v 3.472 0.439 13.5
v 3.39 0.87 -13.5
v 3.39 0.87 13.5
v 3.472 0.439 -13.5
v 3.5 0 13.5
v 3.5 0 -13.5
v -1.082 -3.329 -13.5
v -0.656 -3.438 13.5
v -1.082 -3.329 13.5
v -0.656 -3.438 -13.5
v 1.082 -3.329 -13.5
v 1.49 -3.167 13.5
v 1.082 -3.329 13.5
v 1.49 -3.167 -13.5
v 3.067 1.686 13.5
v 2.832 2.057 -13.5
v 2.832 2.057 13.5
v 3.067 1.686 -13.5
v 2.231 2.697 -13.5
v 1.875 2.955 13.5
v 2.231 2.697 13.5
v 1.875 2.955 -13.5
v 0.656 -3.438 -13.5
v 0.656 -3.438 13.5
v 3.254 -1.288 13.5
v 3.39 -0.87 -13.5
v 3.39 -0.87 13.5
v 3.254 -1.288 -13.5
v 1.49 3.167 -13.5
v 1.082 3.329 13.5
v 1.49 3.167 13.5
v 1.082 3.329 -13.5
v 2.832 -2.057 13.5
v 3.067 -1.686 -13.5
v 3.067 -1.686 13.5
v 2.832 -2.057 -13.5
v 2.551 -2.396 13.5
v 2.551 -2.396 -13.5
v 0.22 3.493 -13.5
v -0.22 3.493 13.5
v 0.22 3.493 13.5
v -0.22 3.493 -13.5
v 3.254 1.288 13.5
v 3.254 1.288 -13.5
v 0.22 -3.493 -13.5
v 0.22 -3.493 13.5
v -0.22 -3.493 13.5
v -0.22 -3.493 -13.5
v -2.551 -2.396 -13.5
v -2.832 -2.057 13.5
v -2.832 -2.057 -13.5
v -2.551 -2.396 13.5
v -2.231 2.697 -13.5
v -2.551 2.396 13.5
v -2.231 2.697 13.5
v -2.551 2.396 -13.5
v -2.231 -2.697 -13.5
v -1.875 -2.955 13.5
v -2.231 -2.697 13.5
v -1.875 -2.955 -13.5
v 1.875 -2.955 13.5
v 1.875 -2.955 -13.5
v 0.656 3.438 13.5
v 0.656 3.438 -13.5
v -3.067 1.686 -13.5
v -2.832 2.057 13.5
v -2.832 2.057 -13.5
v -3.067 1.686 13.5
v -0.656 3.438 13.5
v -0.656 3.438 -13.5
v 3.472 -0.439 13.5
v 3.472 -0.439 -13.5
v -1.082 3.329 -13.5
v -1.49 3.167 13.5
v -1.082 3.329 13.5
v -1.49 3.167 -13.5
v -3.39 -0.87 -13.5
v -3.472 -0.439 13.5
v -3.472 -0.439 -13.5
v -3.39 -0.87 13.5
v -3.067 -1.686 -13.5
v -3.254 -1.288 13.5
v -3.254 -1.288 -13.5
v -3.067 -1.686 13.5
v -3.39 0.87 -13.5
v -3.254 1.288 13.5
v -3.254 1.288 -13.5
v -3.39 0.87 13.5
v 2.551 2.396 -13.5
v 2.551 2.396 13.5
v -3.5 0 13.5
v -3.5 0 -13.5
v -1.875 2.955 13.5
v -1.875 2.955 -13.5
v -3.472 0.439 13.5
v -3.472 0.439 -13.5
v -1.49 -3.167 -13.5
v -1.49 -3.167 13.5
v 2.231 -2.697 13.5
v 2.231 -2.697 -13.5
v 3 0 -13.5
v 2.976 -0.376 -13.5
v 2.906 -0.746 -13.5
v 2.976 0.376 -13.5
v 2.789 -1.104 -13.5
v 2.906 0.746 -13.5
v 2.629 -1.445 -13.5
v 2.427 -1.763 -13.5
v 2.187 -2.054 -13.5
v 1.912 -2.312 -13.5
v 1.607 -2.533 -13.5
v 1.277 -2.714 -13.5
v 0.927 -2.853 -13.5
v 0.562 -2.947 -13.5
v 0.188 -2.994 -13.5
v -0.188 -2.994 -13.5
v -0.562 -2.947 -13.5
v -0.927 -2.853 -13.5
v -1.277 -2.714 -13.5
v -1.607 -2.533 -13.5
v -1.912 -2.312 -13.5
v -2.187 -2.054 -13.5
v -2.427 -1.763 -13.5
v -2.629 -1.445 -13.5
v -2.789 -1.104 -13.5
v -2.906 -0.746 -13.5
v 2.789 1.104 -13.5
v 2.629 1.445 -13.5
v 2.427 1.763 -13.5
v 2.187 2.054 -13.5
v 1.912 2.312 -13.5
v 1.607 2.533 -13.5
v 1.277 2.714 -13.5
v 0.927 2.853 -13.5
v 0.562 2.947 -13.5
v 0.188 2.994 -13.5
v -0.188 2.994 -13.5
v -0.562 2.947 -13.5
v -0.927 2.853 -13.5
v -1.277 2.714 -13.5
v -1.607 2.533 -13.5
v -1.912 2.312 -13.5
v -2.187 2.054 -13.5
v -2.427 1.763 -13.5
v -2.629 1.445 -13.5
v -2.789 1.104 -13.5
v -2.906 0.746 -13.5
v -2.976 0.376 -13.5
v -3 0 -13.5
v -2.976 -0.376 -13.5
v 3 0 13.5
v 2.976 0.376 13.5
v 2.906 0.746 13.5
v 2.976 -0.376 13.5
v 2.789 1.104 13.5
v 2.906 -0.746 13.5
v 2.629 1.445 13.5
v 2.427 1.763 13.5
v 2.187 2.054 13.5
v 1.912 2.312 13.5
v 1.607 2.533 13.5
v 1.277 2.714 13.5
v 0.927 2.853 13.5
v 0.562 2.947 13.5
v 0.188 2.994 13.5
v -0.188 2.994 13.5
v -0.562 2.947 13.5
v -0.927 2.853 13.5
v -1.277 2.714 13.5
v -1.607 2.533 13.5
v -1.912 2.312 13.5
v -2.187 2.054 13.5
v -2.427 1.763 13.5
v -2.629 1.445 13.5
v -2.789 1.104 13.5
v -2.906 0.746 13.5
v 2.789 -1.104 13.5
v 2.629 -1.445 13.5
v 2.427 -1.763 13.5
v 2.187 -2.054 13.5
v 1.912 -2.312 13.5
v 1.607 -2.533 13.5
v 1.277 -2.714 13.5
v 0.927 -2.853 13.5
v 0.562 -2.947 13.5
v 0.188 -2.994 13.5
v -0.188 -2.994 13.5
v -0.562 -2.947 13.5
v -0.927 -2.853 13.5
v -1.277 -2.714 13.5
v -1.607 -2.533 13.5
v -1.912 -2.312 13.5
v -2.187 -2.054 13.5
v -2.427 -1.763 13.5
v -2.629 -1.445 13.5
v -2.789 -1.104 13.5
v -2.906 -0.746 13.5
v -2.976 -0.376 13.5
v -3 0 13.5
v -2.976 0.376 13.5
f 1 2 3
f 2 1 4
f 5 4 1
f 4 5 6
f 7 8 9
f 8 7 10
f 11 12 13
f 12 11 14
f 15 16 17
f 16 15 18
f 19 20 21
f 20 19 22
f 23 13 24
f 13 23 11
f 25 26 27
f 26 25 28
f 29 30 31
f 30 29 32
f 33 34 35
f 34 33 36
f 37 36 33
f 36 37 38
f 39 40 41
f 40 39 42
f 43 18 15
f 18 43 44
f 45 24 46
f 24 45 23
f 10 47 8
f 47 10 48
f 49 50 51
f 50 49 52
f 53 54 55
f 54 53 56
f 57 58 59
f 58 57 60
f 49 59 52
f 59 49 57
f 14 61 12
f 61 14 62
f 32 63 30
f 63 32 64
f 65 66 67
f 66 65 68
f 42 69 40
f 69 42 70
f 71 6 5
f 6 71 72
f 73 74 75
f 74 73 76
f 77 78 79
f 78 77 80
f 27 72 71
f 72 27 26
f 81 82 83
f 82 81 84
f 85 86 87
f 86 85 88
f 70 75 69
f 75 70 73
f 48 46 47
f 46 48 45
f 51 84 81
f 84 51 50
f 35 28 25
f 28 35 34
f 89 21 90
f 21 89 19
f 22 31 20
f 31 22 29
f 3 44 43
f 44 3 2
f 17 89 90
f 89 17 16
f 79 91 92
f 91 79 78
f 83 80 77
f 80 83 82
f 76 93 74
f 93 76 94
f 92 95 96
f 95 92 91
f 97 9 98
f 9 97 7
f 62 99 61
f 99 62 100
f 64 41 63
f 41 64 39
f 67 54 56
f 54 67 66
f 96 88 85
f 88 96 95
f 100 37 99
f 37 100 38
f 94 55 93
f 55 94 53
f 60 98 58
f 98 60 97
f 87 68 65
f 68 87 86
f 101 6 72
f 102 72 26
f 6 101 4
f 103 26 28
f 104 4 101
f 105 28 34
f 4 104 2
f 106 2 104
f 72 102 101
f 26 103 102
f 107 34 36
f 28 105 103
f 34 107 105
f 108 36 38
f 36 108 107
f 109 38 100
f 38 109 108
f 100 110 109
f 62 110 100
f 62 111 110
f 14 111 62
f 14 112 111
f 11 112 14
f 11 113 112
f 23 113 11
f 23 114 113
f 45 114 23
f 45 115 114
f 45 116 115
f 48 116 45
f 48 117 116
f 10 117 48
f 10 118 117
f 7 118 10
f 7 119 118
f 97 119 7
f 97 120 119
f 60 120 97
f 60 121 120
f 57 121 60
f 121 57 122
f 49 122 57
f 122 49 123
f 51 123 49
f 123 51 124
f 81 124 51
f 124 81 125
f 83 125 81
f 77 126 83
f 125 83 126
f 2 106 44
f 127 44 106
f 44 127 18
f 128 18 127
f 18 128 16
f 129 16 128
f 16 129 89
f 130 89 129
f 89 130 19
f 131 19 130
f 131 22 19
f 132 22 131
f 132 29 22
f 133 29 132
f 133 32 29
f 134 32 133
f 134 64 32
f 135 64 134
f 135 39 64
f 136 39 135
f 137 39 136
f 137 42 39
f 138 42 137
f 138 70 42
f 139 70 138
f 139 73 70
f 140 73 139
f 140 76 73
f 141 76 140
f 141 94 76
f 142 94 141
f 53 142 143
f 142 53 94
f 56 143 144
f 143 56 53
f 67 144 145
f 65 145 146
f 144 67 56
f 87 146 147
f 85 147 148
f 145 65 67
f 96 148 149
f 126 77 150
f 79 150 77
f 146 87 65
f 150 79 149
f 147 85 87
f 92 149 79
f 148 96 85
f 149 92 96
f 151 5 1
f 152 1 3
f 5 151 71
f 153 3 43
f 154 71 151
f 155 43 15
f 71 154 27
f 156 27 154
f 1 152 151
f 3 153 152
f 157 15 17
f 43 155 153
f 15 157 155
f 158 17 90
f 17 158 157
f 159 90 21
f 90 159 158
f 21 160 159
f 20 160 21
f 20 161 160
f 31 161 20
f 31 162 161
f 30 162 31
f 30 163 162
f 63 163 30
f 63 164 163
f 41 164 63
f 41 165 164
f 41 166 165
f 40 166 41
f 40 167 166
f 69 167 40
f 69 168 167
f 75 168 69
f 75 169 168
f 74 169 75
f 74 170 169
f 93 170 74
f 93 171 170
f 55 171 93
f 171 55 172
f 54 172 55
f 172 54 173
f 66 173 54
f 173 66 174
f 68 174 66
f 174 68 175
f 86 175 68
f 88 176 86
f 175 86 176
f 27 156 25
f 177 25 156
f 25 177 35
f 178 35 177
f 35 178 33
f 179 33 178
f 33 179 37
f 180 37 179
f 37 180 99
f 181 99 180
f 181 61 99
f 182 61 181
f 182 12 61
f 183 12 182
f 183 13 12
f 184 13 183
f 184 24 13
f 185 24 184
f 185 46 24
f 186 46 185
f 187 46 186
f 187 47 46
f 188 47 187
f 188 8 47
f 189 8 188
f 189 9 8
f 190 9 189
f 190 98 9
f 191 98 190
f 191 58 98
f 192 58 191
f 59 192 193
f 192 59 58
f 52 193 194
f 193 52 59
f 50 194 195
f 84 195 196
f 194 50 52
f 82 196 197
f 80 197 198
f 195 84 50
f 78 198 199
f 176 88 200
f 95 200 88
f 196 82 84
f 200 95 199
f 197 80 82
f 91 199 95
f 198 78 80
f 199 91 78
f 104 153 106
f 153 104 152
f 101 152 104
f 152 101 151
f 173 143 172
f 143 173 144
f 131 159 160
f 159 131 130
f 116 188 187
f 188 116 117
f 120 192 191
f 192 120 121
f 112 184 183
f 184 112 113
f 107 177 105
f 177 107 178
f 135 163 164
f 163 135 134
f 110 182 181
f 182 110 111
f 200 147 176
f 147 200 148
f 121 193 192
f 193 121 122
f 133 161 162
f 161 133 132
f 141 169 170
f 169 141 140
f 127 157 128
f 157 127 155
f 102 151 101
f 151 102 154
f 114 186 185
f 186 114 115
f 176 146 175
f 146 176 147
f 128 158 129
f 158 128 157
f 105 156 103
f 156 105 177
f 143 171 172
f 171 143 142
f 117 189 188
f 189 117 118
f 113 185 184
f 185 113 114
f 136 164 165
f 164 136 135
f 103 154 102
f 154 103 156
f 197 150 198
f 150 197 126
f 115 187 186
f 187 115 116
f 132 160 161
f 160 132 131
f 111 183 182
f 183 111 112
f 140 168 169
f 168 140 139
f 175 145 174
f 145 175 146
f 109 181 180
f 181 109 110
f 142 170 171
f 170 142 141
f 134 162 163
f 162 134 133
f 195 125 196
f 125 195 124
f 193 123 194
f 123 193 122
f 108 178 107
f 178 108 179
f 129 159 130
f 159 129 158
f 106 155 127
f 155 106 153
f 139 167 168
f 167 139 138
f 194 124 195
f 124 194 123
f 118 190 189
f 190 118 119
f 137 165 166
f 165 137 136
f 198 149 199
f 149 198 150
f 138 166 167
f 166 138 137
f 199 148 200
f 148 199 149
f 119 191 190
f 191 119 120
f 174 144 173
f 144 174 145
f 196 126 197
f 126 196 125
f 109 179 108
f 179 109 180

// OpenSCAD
$fn = 50;


difference() {
	union() {
		translate(v = [0, 0, -13.5000000000]) {
			cylinder(h = 27, r = 3.5000000000);
		}
	}
	union() {
		translate(v = [0, 0, -100.0000000000]) {
			cylinder(h = 200, r = 3.0000000000);
		}
	}
}
